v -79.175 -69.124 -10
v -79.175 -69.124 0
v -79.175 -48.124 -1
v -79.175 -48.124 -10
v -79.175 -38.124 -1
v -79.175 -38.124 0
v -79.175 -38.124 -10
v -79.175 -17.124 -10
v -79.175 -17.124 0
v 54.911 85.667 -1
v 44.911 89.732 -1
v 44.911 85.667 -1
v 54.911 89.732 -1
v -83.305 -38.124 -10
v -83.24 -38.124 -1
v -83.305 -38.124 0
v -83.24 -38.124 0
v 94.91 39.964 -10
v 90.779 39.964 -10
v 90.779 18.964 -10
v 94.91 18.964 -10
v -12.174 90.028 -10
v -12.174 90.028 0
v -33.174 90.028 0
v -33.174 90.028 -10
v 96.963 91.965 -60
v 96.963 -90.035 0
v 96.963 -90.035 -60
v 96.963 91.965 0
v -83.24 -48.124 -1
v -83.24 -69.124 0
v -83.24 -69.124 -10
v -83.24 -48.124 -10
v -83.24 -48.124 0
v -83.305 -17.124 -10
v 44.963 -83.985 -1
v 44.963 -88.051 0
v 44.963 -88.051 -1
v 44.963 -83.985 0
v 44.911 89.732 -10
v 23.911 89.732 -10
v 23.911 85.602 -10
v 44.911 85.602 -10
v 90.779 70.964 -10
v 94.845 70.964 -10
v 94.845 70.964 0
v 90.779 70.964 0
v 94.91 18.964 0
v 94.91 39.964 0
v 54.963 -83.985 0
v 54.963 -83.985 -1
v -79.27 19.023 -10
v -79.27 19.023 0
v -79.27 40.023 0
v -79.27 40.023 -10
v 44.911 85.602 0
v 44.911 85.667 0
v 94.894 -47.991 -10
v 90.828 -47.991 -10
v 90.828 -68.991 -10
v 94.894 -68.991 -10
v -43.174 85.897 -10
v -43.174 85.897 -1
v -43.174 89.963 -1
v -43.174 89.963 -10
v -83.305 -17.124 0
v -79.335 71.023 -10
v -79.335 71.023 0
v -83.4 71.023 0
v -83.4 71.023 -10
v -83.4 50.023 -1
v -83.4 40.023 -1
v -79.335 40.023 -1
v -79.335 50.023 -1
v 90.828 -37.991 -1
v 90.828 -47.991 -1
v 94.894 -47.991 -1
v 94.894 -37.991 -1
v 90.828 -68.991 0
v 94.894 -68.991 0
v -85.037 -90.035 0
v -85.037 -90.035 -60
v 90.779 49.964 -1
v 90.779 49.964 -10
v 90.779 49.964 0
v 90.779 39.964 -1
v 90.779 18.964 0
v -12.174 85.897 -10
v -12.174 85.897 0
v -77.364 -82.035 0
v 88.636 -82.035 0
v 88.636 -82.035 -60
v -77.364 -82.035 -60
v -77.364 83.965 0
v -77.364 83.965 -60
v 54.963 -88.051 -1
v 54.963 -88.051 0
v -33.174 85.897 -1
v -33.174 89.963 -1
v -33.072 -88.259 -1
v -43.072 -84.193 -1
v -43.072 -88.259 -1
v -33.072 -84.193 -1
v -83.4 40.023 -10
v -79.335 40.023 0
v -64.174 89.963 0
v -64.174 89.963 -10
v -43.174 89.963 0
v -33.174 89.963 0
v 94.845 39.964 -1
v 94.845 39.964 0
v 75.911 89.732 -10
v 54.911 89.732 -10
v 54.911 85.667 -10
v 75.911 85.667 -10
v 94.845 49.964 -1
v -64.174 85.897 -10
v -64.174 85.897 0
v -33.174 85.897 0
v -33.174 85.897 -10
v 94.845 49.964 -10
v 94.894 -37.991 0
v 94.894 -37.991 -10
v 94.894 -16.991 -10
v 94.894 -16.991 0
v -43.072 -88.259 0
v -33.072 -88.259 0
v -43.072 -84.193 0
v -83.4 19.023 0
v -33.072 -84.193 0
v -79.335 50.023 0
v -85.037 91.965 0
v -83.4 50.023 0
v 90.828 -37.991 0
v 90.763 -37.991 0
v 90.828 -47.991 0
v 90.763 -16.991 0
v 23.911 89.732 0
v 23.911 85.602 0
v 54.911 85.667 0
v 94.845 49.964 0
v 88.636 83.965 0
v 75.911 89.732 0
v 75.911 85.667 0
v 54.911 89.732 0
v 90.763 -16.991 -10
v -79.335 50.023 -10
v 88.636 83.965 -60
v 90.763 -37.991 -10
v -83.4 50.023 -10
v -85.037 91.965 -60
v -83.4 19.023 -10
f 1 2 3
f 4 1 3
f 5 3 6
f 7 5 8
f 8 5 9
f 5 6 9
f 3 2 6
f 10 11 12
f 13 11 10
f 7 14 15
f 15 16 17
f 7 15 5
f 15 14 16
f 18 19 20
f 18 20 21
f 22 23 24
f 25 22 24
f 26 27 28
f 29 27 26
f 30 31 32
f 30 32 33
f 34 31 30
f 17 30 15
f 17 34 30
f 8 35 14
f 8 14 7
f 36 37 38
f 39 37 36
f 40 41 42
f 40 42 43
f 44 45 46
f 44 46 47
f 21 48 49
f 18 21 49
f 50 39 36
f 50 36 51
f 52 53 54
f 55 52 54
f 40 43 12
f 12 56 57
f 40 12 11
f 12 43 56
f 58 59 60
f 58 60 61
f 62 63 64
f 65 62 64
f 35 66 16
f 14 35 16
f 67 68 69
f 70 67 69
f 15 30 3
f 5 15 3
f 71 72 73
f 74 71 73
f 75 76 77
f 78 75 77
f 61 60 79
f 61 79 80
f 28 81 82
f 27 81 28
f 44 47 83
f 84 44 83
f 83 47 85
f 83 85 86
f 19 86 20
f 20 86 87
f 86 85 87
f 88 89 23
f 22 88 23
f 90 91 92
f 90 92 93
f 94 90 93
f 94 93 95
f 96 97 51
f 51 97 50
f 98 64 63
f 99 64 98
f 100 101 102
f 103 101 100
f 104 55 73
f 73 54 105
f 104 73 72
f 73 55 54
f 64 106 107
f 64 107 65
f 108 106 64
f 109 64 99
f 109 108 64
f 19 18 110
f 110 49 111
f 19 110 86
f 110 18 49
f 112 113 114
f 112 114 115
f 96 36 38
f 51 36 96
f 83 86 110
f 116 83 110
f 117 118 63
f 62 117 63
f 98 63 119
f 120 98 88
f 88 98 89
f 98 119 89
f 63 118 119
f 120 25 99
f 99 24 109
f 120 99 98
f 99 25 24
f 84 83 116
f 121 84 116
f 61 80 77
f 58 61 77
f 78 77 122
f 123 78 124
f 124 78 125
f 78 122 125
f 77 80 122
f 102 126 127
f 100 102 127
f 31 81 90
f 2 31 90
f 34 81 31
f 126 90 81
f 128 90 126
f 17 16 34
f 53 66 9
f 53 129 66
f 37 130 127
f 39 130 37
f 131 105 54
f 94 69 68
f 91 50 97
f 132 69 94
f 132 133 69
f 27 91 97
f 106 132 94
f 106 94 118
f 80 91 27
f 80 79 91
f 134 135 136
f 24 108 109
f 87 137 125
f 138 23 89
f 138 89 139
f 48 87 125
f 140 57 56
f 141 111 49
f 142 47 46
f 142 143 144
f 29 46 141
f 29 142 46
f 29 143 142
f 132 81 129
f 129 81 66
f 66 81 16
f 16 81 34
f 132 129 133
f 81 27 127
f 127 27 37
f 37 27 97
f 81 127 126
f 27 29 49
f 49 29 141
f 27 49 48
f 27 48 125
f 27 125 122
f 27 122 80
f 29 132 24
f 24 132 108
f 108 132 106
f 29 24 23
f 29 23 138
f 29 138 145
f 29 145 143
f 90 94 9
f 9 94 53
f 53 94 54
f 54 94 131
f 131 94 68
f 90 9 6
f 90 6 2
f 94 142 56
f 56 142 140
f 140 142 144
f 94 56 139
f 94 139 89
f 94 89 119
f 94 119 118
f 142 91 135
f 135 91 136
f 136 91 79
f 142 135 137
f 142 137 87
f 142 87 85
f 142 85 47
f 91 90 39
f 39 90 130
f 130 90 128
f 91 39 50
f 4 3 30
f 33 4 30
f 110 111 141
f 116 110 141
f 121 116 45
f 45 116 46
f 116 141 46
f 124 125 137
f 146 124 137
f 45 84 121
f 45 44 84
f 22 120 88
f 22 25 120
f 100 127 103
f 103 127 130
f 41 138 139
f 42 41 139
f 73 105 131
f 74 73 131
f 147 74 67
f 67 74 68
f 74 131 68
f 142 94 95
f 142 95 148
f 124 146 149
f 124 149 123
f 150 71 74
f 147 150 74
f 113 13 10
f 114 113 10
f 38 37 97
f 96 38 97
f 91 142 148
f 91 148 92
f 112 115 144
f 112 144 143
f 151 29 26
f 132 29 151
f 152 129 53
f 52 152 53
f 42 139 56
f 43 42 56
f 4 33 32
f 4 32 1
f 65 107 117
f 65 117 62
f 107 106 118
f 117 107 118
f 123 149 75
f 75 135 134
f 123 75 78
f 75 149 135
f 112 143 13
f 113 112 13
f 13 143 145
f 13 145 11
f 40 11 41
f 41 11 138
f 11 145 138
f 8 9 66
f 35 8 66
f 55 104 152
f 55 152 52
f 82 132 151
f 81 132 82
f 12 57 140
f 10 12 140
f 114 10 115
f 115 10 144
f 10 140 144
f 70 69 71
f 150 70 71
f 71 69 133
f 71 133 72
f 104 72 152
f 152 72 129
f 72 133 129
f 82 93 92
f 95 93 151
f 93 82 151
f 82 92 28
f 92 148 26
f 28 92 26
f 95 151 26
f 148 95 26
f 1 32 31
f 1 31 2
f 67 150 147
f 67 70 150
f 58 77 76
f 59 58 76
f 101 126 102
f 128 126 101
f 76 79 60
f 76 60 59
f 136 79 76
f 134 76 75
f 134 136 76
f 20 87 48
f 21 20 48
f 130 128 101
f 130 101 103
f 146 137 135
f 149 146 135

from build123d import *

# Parameters (mm, degrees)
F0_W     = 4.0655732155
F0_H     = 10
F0_W_2   = 10
F0_H_2   = 4.0655732155
F1_DEPTH = 60
F2_DEPTH = 10
F3_DEPTH = 1


with BuildPart() as f1:
    # F0 (on Top) → F1 (new body)
    with BuildSketch(Plane.XY):
        Polygon((-81.7574552458, 91.9649731191), (-85.0374214202, 91.9649731191), (-85.0374214202, 87.5400633349), (-85.0374214202, 55.211449102), (-85.0374214202, -53.3124324366), (-85.0374214202, -86.6156537372), (-85.0374214202, -90.0350268809), (-80.8175235253, -90.0350268809), (-48.580678454, -90.0350268809), (96.9625785798, -90.0350268809), (96.9625785798, 91.9649731191), align=None)
        Polygon((-33.0721171855, -88.258663221), (-43.0721171855, -88.258663221), (-48.580678454, -88.258663221), (-64.0721171855, -88.258663221), (-64.0721171855, -84.1930900056), (-43.0721171855, -84.1930900056), (-33.0721171855, -84.1930900056), (-33.0721171855, -84.127867623), (-12.0721171855, -84.127867623), (-12.0721171855, -88.258663221), align=None, mode=Mode.SUBTRACT)
        Polygon((-79.1745140415, -38.1238959565), (-79.1745140415, -48.1238959565), (-79.1745140415, -53.3124324366), (-79.1745140415, -69.1238959565), (-83.240087257, -69.1238959565), (-83.240087257, -53.3124324366), (-83.240087257, -48.1238959565), (-83.240087257, -38.1238959565), (-83.3053096395, -38.1238959565), (-83.3053096395, -17.1238959565), (-79.1745140415, -17.1238959565), align=None, mode=Mode.SUBTRACT)
        Polygon((44.9625785798, -83.9851424098), (54.9625785798, -83.9851424098), (60.1511150599, -83.9851424098), (75.9625785798, -83.9851424098), (75.9625785798, -88.0507156253), (60.1511150599, -88.0507156253), (54.9625785798, -88.0507156253), (44.9625785798, -88.0507156253), (44.9625785798, -88.1159380078), (23.9625785798, -88.1159380078), (23.9625785798, -83.9851424098), align=None, mode=Mode.SUBTRACT)
        Polygon((94.8935046063, -37.9912286836), (94.8935046063, -47.9912286836), (94.8935046063, -53.1797651637), (94.8935046063, -68.9912286836), (90.8279313908, -68.9912286836), (90.8279313908, -53.1797651637), (90.8279313908, -47.9912286836), (90.8279313908, -37.9912286836), (90.7627090082, -37.9912286836), (90.7627090082, -16.9912286836), (94.8935046063, -16.9912286836), align=None, mode=Mode.SUBTRACT)
        Polygon((-83.4004647296, 40.0229126219), (-83.4004647296, 50.0229126219), (-83.4004647296, 55.211449102), (-83.4004647296, 71.0229126219), (-79.3348915141, 71.0229126219), (-79.3348915141, 55.211449102), (-79.3348915141, 50.0229126219), (-79.3348915141, 40.0229126219), (-79.2696691316, 40.0229126219), (-79.2696691316, 19.0229126219), (-83.4004647296, 19.0229126219), align=None, mode=Mode.SUBTRACT)
        Polygon((-77.3635556847, 55.211449102), (-77.3635556847, 83.9649731191), (-48.3621415186, 83.9649731191), (61.3571461726, 83.9649731191), (88.6364443153, 83.9649731191), (88.6364443153, -82.0350268809), (-77.3635556847, -82.0350268809), (-77.3635556847, -53.3124324366), align=None, mode=Mode.SUBTRACT)
        Polygon((-33.1736050386, 85.8970538511), (-43.1736050386, 85.8970538511), (-48.3621415186, 85.8970538511), (-64.1736050386, 85.8970538511), (-64.1736050386, 89.9626270666), (-48.3621415186, 89.9626270666), (-43.1736050386, 89.9626270666), (-33.1736050386, 89.9626270666), (-33.1736050386, 90.0278494491), (-12.1736050386, 90.0278494491), (-12.1736050386, 85.8970538511), align=None, mode=Mode.SUBTRACT)
        Polygon((90.7789625961, 39.9640733615), (90.7789625961, 49.9640733615), (90.7789625961, 55.1526098416), (90.7789625961, 70.9640733615), (94.8445358116, 70.9640733615), (94.8445358116, 55.1526098416), (94.8445358116, 49.9640733615), (94.8445358116, 39.9640733615), (94.9097581941, 39.9640733615), (94.9097581941, 18.9640733615), (90.7789625961, 18.9640733615), align=None, mode=Mode.SUBTRACT)
        Polygon((44.9113614697, 89.7324799762), (54.9113614697, 89.7324799762), (61.3571461726, 89.7324799762), (75.9113614697, 89.7324799762), (75.9113614697, 85.6669067607), (61.3571461726, 85.6669067607), (54.9113614697, 85.6669067607), (44.9113614697, 85.6669067607), (44.9113614697, 85.6016843782), (23.9113614697, 85.6016843782), (23.9113614697, 89.7324799762), align=None, mode=Mode.SUBTRACT)
        Polygon((-79.3348915141, 40.0229126219), (-83.4004647296, 40.0229126219), (-83.4004647296, 19.0229126219), (-79.2696691316, 19.0229126219), (-79.2696691316, 40.0229126219), align=None)
        with Locations((-81.3676781219, 45.0229126219)):
            Rectangle(F0_W, F0_H)
        Polygon((-83.4004647296, 55.211449102), (-83.4004647296, 50.0229126219), (-79.3348915141, 50.0229126219), (-79.3348915141, 55.211449102), (-79.3348915141, 71.0229126219), (-83.4004647296, 71.0229126219), align=None)
        Polygon((-48.3621415186, 85.8970538511), (-43.1736050386, 85.8970538511), (-43.1736050386, 89.9626270666), (-48.3621415186, 89.9626270666), (-64.1736050386, 89.9626270666), (-64.1736050386, 85.8970538511), align=None)
        with Locations((-38.1736050386, 87.9298404588)):
            Rectangle(F0_W_2, F0_H_2)
        Polygon((-33.1736050386, 89.9626270666), (-33.1736050386, 85.8970538511), (-12.1736050386, 85.8970538511), (-12.1736050386, 90.0278494491), (-33.1736050386, 90.0278494491), align=None)
        Polygon((44.9113614697, 85.6669067607), (44.9113614697, 89.7324799762), (23.9113614697, 89.7324799762), (23.9113614697, 85.6016843782), (44.9113614697, 85.6016843782), align=None)
        with Locations((49.9113614697, 87.6996933685)):
            Rectangle(F0_W_2, F0_H_2)
        Polygon((61.3571461726, 89.7324799762), (54.9113614697, 89.7324799762), (54.9113614697, 85.6669067607), (61.3571461726, 85.6669067607), (75.9113614697, 85.6669067607), (75.9113614697, 89.7324799762), align=None)
        Polygon((90.7789625961, 55.1526098416), (90.7789625961, 49.9640733615), (94.8445358116, 49.9640733615), (94.8445358116, 55.1526098416), (94.8445358116, 70.9640733615), (90.7789625961, 70.9640733615), align=None)
        with Locations((92.8117492038, 44.9640733615)):
            Rectangle(F0_W, F0_H)
        Polygon((94.8445358116, 39.9640733615), (90.7789625961, 39.9640733615), (90.7789625961, 18.9640733615), (94.9097581941, 18.9640733615), (94.9097581941, 39.9640733615), align=None)
        Polygon((90.8279313908, -37.9912286836), (94.8935046063, -37.9912286836), (94.8935046063, -16.9912286836), (90.7627090082, -16.9912286836), (90.7627090082, -37.9912286836), align=None)
        with Locations((92.8607179985, -42.9912286836)):
            Rectangle(F0_W, F0_H)
        Polygon((94.8935046063, -53.1797651637), (94.8935046063, -47.9912286836), (90.8279313908, -47.9912286836), (90.8279313908, -53.1797651637), (90.8279313908, -68.9912286836), (94.8935046063, -68.9912286836), align=None)
        Polygon((60.1511150599, -83.9851424098), (54.9625785798, -83.9851424098), (54.9625785798, -88.0507156253), (60.1511150599, -88.0507156253), (75.9625785798, -88.0507156253), (75.9625785798, -83.9851424098), align=None)
        with Locations((49.9625785798, -86.0179290175)):
            Rectangle(F0_W_2, F0_H_2)
        Polygon((44.9625785798, -88.0507156253), (44.9625785798, -83.9851424098), (23.9625785798, -83.9851424098), (23.9625785798, -88.1159380078), (44.9625785798, -88.1159380078), align=None)
        Polygon((-33.0721171855, -84.1930900056), (-33.0721171855, -88.258663221), (-12.0721171855, -88.258663221), (-12.0721171855, -84.127867623), (-33.0721171855, -84.127867623), align=None)
        with Locations((-38.0721171855, -86.2258766133)):
            Rectangle(F0_W_2, F0_H_2)
        Polygon((-48.580678454, -88.258663221), (-43.0721171855, -88.258663221), (-43.0721171855, -84.1930900056), (-64.0721171855, -84.1930900056), (-64.0721171855, -88.258663221), align=None)
        Polygon((-79.1745140415, -53.3124324366), (-79.1745140415, -48.1238959565), (-83.240087257, -48.1238959565), (-83.240087257, -53.3124324366), (-83.240087257, -69.1238959565), (-79.1745140415, -69.1238959565), align=None)
        with Locations((-81.2073006492, -43.1238959565)):
            Rectangle(F0_W, F0_H)
        Polygon((-83.240087257, -38.1238959565), (-79.1745140415, -38.1238959565), (-79.1745140415, -17.1238959565), (-83.3053096395, -17.1238959565), (-83.3053096395, -38.1238959565), align=None)
    extrude(amount=-F1_DEPTH)

    # F0 (on Top) → F2 (cut)
    with BuildSketch(Plane.XY):
        Polygon((-83.4004647296, 55.211449102), (-83.4004647296, 50.0229126219), (-79.3348915141, 50.0229126219), (-79.3348915141, 55.211449102), (-79.3348915141, 71.0229126219), (-83.4004647296, 71.0229126219), align=None)
        Polygon((-79.3348915141, 40.0229126219), (-83.4004647296, 40.0229126219), (-83.4004647296, 19.0229126219), (-79.2696691316, 19.0229126219), (-79.2696691316, 40.0229126219), align=None)
        Polygon((90.7789625961, 55.1526098416), (90.7789625961, 49.9640733615), (94.8445358116, 49.9640733615), (94.8445358116, 55.1526098416), (94.8445358116, 70.9640733615), (90.7789625961, 70.9640733615), align=None)
        Polygon((94.8445358116, 39.9640733615), (90.7789625961, 39.9640733615), (90.7789625961, 18.9640733615), (94.9097581941, 18.9640733615), (94.9097581941, 39.9640733615), align=None)
        Polygon((-83.240087257, -38.1238959565), (-79.1745140415, -38.1238959565), (-79.1745140415, -17.1238959565), (-83.3053096395, -17.1238959565), (-83.3053096395, -38.1238959565), align=None)
        Polygon((-79.1745140415, -53.3124324366), (-79.1745140415, -48.1238959565), (-83.240087257, -48.1238959565), (-83.240087257, -53.3124324366), (-83.240087257, -69.1238959565), (-79.1745140415, -69.1238959565), align=None)
        Polygon((94.8935046063, -53.1797651637), (94.8935046063, -47.9912286836), (90.8279313908, -47.9912286836), (90.8279313908, -53.1797651637), (90.8279313908, -68.9912286836), (94.8935046063, -68.9912286836), align=None)
        Polygon((90.8279313908, -37.9912286836), (94.8935046063, -37.9912286836), (94.8935046063, -16.9912286836), (90.7627090082, -16.9912286836), (90.7627090082, -37.9912286836), align=None)
        Polygon((61.3571461726, 89.7324799762), (54.9113614697, 89.7324799762), (54.9113614697, 85.6669067607), (61.3571461726, 85.6669067607), (75.9113614697, 85.6669067607), (75.9113614697, 89.7324799762), align=None)
        Polygon((44.9113614697, 85.6669067607), (44.9113614697, 89.7324799762), (23.9113614697, 89.7324799762), (23.9113614697, 85.6016843782), (44.9113614697, 85.6016843782), align=None)
        Polygon((-33.1736050386, 89.9626270666), (-33.1736050386, 85.8970538511), (-12.1736050386, 85.8970538511), (-12.1736050386, 90.0278494491), (-33.1736050386, 90.0278494491), align=None)
        Polygon((-48.3621415186, 85.8970538511), (-43.1736050386, 85.8970538511), (-43.1736050386, 89.9626270666), (-48.3621415186, 89.9626270666), (-64.1736050386, 89.9626270666), (-64.1736050386, 85.8970538511), align=None)
    extrude(amount=-F2_DEPTH, mode=Mode.SUBTRACT)

    # F0 (on Top) → F3 (cut)
    with BuildSketch(Plane.XY):
        with Locations((-81.3676781219, 45.0229126219)):
            Rectangle(F0_W, F0_H)
        with Locations((-81.2073006492, -43.1238959565)):
            Rectangle(F0_W, F0_H)
        with Locations((92.8607179985, -42.9912286836)):
            Rectangle(F0_W, F0_H)
        with Locations((92.8117492038, 44.9640733615)):
            Rectangle(F0_W, F0_H)
        with Locations((49.9113614697, 87.6996933685)):
            Rectangle(F0_W_2, F0_H_2)
        with Locations((-38.1736050386, 87.9298404588)):
            Rectangle(F0_W_2, F0_H_2)
        with Locations((-38.0721171855, -86.2258766133)):
            Rectangle(F0_W_2, F0_H_2)
        with Locations((49.9625785798, -86.0179290175)):
            Rectangle(F0_W_2, F0_H_2)
    extrude(amount=-F3_DEPTH, mode=Mode.SUBTRACT)


solid = f1.part
